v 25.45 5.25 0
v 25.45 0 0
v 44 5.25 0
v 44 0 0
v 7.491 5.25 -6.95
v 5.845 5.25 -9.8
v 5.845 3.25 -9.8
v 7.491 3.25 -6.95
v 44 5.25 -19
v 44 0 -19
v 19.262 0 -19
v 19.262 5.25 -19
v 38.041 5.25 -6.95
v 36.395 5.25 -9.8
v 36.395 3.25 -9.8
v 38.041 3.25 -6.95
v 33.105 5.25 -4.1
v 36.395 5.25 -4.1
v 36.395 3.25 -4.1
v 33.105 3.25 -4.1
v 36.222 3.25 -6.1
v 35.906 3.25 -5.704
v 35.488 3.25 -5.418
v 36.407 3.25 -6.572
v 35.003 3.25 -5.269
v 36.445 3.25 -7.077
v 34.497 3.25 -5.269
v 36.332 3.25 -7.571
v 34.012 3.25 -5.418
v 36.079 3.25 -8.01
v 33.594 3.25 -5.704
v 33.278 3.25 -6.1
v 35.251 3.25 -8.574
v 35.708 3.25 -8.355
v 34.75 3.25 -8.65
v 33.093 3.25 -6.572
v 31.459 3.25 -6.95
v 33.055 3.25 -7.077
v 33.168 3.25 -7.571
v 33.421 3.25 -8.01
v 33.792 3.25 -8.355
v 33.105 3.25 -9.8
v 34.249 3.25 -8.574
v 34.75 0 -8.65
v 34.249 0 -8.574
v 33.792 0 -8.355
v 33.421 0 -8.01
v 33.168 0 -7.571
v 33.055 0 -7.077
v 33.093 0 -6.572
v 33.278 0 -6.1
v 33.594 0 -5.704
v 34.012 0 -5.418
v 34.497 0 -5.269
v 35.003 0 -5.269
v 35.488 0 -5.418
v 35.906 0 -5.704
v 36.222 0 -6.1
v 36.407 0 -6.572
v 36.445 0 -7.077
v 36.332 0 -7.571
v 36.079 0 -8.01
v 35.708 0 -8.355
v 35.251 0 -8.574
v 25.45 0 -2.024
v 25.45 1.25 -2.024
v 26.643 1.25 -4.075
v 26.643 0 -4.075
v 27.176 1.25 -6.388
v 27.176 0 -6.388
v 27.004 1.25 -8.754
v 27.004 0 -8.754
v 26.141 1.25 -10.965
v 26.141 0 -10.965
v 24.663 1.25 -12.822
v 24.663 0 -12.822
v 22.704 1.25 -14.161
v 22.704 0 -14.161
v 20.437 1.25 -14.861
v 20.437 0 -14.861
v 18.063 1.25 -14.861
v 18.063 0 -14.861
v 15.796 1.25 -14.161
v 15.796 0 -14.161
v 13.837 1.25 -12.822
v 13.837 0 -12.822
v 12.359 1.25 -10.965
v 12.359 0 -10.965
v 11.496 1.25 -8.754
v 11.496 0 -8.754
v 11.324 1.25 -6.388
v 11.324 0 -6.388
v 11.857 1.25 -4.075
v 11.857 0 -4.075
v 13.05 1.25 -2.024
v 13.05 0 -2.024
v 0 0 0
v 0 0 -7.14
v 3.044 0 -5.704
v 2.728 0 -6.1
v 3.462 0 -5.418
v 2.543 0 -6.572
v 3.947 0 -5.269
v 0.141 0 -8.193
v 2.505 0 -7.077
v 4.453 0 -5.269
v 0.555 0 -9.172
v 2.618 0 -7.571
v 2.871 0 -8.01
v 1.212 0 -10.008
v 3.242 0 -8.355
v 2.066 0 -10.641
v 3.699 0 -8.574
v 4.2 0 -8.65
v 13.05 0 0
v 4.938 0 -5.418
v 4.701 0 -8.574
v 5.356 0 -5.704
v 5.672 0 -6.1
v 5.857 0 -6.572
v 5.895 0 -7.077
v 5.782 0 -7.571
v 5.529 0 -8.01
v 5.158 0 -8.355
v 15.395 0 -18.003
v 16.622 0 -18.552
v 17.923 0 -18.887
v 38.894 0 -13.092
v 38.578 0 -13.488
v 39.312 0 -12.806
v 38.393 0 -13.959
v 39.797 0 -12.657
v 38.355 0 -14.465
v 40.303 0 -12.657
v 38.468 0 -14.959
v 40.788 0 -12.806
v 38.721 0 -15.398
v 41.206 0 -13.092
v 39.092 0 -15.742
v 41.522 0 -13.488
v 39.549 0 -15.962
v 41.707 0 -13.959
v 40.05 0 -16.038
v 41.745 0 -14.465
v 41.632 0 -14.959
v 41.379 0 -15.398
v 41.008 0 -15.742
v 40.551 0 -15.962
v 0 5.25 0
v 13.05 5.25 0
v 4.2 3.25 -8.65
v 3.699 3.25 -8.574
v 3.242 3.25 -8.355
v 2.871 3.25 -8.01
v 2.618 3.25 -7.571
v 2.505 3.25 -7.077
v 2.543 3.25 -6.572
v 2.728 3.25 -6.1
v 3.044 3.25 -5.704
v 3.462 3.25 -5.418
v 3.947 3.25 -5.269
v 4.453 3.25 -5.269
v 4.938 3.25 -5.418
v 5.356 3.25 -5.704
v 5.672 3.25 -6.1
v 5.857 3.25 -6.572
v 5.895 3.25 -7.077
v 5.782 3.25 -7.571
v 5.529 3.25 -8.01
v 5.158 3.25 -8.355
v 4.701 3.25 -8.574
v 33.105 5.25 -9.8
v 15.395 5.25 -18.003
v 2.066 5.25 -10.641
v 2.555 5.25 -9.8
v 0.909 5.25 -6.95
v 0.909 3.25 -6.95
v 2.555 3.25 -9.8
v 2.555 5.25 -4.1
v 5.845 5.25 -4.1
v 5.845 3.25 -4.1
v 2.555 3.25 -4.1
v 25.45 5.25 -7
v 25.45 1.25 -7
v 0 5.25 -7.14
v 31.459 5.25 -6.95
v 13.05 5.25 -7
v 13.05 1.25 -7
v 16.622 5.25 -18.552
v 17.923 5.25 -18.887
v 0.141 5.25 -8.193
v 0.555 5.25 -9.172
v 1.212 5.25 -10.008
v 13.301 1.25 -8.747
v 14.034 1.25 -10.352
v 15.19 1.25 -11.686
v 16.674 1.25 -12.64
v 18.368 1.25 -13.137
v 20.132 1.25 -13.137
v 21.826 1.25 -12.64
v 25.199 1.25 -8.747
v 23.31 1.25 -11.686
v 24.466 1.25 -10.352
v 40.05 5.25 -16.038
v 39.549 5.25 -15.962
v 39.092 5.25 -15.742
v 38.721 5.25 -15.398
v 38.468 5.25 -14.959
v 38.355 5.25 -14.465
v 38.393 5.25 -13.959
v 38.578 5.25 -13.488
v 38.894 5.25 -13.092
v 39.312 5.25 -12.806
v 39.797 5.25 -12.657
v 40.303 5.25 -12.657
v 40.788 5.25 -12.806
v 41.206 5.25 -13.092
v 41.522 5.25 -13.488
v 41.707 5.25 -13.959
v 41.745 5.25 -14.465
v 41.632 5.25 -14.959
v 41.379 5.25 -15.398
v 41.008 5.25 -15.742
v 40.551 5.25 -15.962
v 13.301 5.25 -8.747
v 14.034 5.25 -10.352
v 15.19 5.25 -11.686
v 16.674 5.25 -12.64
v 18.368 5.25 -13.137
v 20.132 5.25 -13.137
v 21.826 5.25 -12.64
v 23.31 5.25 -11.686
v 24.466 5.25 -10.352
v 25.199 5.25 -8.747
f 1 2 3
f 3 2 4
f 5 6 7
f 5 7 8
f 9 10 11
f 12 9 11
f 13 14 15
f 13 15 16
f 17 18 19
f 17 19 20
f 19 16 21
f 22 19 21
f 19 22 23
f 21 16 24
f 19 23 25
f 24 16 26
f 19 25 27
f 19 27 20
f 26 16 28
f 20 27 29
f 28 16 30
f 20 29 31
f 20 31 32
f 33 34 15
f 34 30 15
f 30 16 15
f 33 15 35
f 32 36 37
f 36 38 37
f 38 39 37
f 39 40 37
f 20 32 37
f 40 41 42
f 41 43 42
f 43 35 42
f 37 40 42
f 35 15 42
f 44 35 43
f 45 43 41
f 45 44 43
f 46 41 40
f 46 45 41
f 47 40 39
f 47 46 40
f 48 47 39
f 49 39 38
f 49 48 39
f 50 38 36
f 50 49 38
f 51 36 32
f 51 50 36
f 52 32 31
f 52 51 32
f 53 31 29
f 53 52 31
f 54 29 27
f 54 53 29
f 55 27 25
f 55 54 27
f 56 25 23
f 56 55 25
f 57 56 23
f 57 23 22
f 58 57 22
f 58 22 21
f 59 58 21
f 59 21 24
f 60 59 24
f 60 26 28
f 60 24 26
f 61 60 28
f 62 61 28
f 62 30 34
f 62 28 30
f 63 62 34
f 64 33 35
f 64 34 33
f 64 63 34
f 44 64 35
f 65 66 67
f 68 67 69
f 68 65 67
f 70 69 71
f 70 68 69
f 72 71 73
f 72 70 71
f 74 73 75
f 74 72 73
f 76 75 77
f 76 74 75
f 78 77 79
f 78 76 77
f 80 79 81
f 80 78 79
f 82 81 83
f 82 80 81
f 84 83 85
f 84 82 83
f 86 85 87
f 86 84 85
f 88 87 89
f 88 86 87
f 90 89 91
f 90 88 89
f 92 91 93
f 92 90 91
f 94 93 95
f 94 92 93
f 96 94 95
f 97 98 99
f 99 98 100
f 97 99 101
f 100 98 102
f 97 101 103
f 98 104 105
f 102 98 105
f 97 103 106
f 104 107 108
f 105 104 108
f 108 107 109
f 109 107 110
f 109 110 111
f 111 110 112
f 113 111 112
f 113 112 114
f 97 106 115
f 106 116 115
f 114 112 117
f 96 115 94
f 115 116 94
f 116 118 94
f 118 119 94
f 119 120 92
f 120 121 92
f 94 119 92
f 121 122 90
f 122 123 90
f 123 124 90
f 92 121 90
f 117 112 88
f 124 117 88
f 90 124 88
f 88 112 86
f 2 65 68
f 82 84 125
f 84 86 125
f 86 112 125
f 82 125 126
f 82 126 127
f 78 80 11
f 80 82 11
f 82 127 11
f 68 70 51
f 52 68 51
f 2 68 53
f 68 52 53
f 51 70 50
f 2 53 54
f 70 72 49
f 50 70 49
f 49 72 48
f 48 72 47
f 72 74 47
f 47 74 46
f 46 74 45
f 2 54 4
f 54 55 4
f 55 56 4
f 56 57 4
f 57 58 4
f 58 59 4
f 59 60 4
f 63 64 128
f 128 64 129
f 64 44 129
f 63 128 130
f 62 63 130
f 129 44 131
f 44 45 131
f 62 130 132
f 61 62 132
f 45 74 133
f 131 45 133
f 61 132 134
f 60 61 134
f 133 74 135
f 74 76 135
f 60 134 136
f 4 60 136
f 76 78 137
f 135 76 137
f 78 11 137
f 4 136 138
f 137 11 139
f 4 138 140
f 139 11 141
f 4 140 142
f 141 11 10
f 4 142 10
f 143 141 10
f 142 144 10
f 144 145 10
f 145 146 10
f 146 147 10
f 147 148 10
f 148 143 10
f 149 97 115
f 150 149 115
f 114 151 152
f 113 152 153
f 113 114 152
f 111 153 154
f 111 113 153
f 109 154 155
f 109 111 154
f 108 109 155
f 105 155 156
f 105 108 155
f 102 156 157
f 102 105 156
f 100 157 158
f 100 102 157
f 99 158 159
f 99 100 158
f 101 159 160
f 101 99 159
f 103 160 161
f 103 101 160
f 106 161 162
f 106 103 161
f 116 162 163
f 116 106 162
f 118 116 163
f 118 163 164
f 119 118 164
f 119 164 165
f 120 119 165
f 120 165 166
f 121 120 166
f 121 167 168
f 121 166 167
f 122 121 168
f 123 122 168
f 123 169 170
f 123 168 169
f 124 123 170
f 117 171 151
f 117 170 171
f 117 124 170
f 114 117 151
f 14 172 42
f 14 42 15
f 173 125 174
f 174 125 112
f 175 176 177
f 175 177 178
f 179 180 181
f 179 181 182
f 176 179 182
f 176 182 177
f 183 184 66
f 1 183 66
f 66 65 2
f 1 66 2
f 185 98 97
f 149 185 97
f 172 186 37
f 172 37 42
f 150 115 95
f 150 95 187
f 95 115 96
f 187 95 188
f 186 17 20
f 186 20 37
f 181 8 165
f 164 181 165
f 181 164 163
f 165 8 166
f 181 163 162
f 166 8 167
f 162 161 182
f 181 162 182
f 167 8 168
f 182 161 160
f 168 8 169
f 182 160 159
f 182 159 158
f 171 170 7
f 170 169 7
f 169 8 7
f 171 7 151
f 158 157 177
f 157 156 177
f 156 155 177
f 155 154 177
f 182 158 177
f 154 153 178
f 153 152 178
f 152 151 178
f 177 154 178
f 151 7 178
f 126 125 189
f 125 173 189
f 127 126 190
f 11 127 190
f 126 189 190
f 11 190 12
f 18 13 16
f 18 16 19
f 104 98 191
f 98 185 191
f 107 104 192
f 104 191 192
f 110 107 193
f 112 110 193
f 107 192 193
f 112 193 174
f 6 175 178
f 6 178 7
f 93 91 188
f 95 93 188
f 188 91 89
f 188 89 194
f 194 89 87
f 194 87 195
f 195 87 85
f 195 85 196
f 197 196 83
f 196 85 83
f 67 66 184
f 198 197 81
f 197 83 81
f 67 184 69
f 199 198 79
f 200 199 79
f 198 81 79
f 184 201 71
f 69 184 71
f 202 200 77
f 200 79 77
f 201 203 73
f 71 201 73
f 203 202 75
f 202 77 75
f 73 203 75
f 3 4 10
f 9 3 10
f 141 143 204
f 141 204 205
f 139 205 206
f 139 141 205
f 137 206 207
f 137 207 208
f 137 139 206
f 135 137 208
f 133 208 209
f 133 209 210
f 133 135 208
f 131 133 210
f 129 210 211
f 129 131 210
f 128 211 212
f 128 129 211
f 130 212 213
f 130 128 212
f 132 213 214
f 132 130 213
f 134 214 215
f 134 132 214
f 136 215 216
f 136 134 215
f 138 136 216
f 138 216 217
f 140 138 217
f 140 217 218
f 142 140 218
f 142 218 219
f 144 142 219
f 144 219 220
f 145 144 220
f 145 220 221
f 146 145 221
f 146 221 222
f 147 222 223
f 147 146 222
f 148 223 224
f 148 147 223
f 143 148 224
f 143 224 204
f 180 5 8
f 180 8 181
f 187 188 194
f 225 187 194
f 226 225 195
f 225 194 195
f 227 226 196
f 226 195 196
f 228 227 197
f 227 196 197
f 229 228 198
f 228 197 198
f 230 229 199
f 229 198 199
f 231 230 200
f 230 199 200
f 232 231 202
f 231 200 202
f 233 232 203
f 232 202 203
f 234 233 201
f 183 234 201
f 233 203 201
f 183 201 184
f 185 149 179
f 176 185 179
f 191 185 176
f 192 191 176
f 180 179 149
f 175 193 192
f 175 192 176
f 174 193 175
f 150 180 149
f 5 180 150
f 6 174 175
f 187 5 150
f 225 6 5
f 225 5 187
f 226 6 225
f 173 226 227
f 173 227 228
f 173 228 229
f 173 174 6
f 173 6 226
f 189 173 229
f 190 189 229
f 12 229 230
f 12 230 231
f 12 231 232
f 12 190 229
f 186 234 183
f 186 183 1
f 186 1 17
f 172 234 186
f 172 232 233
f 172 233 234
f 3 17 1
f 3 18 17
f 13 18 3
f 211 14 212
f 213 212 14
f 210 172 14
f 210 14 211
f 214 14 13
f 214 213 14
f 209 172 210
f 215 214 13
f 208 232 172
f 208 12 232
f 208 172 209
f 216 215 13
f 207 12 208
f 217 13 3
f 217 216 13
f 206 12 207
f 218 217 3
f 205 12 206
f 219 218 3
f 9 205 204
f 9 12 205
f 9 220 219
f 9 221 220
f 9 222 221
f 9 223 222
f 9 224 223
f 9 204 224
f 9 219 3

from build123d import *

# Parameters (mm, degrees)
ESBO_O1_R                = 1.7
RESSALTO_EXTRUS_O1_DEPTH = 5.25
ESBO_O2_R                = 7.95
CORTE_EXTRUS_O1_DEPTH    = 1.25
FILETE1_R                = 4
FILETE2_R                = 8
CORTE_EXTRUS_O2_DEPTH    = 2


with BuildPart() as part:
    # Esboço1 → Ressalto-extrusão1 (new body)
    with BuildSketch(Plane(origin=(0, 0, 0), x_dir=(1, 0, 0), z_dir=(0, 1, 0))):
        with BuildLine():
            Line((13.05, 0), (13.05, 7))
            ThreePointArc((13.05, 7), (19.25, 13.2), (25.45, 7))
            Line((25.45, 7), (25.45, 0))
            Line((25.45, 0), (44, 0))
            Line((44, 0), (44, 19))
            Line((44, 19), (17.2, 19))
            Line((17.2, 19), (0, 9.5))
            Line((0, 9.5), (0, 0))
            Line((0, 0), (13.05, 0))
        make_face()
        with Locations(Location((4.2, 6.95, 0), (0, 0, 90))):
            Circle(ESBO_O1_R, mode=Mode.SUBTRACT)
        with Locations(Location((34.75, 6.95, 0), (0, 0, 90))):
            Circle(ESBO_O1_R, mode=Mode.SUBTRACT)
        with Locations(Location((40.05, 14.337730871, 0), (0, 0, 90))):
            Circle(ESBO_O1_R, mode=Mode.SUBTRACT)
    extrude(amount=RESSALTO_EXTRUS_O1_DEPTH)

    # Esboço2 → Corte-extrusão1 (cut)
    with BuildSketch(Plane(origin=(0, 0, 0), x_dir=(1, 0, 0), z_dir=(0, 1, 0))):
        with Locations((19.25, 7)):
            Circle(ESBO_O2_R)
    extrude(amount=CORTE_EXTRUS_O1_DEPTH, mode=Mode.SUBTRACT)

    # Filete1
    filete1_edges = [part.edges().sort_by_distance(p)[0] for p in [
        (0, 2.625, -9.5),
    ]]
    fillet(filete1_edges, radius=FILETE1_R)

    # Filete2
    filete2_edges = [part.edges().sort_by_distance(p)[0] for p in [
        (17.2, 2.625, -19),
    ]]
    fillet(filete2_edges, radius=FILETE2_R)

    # Esboço3 → Corte-extrusão2 (cut)
    with BuildSketch(Plane(origin=(0, 5.25, 0), x_dir=(-1, 0, 0), z_dir=(0, -1, 0))):
        Polygon((-31.459103466, 6.95), (-33.104551733, 9.8), (-36.395448267, 9.8), (-38.040896534, 6.95), (-36.395448267, 4.1), (-33.104551733, 4.1), align=None)
        Polygon((-0.909103466, 6.95), (-2.554551733, 9.8), (-5.845448267, 9.8), (-7.490896534, 6.95), (-5.845448267, 4.1), (-2.554551733, 4.1), align=None)
    extrude(amount=CORTE_EXTRUS_O2_DEPTH, mode=Mode.SUBTRACT)


solid = part.part
